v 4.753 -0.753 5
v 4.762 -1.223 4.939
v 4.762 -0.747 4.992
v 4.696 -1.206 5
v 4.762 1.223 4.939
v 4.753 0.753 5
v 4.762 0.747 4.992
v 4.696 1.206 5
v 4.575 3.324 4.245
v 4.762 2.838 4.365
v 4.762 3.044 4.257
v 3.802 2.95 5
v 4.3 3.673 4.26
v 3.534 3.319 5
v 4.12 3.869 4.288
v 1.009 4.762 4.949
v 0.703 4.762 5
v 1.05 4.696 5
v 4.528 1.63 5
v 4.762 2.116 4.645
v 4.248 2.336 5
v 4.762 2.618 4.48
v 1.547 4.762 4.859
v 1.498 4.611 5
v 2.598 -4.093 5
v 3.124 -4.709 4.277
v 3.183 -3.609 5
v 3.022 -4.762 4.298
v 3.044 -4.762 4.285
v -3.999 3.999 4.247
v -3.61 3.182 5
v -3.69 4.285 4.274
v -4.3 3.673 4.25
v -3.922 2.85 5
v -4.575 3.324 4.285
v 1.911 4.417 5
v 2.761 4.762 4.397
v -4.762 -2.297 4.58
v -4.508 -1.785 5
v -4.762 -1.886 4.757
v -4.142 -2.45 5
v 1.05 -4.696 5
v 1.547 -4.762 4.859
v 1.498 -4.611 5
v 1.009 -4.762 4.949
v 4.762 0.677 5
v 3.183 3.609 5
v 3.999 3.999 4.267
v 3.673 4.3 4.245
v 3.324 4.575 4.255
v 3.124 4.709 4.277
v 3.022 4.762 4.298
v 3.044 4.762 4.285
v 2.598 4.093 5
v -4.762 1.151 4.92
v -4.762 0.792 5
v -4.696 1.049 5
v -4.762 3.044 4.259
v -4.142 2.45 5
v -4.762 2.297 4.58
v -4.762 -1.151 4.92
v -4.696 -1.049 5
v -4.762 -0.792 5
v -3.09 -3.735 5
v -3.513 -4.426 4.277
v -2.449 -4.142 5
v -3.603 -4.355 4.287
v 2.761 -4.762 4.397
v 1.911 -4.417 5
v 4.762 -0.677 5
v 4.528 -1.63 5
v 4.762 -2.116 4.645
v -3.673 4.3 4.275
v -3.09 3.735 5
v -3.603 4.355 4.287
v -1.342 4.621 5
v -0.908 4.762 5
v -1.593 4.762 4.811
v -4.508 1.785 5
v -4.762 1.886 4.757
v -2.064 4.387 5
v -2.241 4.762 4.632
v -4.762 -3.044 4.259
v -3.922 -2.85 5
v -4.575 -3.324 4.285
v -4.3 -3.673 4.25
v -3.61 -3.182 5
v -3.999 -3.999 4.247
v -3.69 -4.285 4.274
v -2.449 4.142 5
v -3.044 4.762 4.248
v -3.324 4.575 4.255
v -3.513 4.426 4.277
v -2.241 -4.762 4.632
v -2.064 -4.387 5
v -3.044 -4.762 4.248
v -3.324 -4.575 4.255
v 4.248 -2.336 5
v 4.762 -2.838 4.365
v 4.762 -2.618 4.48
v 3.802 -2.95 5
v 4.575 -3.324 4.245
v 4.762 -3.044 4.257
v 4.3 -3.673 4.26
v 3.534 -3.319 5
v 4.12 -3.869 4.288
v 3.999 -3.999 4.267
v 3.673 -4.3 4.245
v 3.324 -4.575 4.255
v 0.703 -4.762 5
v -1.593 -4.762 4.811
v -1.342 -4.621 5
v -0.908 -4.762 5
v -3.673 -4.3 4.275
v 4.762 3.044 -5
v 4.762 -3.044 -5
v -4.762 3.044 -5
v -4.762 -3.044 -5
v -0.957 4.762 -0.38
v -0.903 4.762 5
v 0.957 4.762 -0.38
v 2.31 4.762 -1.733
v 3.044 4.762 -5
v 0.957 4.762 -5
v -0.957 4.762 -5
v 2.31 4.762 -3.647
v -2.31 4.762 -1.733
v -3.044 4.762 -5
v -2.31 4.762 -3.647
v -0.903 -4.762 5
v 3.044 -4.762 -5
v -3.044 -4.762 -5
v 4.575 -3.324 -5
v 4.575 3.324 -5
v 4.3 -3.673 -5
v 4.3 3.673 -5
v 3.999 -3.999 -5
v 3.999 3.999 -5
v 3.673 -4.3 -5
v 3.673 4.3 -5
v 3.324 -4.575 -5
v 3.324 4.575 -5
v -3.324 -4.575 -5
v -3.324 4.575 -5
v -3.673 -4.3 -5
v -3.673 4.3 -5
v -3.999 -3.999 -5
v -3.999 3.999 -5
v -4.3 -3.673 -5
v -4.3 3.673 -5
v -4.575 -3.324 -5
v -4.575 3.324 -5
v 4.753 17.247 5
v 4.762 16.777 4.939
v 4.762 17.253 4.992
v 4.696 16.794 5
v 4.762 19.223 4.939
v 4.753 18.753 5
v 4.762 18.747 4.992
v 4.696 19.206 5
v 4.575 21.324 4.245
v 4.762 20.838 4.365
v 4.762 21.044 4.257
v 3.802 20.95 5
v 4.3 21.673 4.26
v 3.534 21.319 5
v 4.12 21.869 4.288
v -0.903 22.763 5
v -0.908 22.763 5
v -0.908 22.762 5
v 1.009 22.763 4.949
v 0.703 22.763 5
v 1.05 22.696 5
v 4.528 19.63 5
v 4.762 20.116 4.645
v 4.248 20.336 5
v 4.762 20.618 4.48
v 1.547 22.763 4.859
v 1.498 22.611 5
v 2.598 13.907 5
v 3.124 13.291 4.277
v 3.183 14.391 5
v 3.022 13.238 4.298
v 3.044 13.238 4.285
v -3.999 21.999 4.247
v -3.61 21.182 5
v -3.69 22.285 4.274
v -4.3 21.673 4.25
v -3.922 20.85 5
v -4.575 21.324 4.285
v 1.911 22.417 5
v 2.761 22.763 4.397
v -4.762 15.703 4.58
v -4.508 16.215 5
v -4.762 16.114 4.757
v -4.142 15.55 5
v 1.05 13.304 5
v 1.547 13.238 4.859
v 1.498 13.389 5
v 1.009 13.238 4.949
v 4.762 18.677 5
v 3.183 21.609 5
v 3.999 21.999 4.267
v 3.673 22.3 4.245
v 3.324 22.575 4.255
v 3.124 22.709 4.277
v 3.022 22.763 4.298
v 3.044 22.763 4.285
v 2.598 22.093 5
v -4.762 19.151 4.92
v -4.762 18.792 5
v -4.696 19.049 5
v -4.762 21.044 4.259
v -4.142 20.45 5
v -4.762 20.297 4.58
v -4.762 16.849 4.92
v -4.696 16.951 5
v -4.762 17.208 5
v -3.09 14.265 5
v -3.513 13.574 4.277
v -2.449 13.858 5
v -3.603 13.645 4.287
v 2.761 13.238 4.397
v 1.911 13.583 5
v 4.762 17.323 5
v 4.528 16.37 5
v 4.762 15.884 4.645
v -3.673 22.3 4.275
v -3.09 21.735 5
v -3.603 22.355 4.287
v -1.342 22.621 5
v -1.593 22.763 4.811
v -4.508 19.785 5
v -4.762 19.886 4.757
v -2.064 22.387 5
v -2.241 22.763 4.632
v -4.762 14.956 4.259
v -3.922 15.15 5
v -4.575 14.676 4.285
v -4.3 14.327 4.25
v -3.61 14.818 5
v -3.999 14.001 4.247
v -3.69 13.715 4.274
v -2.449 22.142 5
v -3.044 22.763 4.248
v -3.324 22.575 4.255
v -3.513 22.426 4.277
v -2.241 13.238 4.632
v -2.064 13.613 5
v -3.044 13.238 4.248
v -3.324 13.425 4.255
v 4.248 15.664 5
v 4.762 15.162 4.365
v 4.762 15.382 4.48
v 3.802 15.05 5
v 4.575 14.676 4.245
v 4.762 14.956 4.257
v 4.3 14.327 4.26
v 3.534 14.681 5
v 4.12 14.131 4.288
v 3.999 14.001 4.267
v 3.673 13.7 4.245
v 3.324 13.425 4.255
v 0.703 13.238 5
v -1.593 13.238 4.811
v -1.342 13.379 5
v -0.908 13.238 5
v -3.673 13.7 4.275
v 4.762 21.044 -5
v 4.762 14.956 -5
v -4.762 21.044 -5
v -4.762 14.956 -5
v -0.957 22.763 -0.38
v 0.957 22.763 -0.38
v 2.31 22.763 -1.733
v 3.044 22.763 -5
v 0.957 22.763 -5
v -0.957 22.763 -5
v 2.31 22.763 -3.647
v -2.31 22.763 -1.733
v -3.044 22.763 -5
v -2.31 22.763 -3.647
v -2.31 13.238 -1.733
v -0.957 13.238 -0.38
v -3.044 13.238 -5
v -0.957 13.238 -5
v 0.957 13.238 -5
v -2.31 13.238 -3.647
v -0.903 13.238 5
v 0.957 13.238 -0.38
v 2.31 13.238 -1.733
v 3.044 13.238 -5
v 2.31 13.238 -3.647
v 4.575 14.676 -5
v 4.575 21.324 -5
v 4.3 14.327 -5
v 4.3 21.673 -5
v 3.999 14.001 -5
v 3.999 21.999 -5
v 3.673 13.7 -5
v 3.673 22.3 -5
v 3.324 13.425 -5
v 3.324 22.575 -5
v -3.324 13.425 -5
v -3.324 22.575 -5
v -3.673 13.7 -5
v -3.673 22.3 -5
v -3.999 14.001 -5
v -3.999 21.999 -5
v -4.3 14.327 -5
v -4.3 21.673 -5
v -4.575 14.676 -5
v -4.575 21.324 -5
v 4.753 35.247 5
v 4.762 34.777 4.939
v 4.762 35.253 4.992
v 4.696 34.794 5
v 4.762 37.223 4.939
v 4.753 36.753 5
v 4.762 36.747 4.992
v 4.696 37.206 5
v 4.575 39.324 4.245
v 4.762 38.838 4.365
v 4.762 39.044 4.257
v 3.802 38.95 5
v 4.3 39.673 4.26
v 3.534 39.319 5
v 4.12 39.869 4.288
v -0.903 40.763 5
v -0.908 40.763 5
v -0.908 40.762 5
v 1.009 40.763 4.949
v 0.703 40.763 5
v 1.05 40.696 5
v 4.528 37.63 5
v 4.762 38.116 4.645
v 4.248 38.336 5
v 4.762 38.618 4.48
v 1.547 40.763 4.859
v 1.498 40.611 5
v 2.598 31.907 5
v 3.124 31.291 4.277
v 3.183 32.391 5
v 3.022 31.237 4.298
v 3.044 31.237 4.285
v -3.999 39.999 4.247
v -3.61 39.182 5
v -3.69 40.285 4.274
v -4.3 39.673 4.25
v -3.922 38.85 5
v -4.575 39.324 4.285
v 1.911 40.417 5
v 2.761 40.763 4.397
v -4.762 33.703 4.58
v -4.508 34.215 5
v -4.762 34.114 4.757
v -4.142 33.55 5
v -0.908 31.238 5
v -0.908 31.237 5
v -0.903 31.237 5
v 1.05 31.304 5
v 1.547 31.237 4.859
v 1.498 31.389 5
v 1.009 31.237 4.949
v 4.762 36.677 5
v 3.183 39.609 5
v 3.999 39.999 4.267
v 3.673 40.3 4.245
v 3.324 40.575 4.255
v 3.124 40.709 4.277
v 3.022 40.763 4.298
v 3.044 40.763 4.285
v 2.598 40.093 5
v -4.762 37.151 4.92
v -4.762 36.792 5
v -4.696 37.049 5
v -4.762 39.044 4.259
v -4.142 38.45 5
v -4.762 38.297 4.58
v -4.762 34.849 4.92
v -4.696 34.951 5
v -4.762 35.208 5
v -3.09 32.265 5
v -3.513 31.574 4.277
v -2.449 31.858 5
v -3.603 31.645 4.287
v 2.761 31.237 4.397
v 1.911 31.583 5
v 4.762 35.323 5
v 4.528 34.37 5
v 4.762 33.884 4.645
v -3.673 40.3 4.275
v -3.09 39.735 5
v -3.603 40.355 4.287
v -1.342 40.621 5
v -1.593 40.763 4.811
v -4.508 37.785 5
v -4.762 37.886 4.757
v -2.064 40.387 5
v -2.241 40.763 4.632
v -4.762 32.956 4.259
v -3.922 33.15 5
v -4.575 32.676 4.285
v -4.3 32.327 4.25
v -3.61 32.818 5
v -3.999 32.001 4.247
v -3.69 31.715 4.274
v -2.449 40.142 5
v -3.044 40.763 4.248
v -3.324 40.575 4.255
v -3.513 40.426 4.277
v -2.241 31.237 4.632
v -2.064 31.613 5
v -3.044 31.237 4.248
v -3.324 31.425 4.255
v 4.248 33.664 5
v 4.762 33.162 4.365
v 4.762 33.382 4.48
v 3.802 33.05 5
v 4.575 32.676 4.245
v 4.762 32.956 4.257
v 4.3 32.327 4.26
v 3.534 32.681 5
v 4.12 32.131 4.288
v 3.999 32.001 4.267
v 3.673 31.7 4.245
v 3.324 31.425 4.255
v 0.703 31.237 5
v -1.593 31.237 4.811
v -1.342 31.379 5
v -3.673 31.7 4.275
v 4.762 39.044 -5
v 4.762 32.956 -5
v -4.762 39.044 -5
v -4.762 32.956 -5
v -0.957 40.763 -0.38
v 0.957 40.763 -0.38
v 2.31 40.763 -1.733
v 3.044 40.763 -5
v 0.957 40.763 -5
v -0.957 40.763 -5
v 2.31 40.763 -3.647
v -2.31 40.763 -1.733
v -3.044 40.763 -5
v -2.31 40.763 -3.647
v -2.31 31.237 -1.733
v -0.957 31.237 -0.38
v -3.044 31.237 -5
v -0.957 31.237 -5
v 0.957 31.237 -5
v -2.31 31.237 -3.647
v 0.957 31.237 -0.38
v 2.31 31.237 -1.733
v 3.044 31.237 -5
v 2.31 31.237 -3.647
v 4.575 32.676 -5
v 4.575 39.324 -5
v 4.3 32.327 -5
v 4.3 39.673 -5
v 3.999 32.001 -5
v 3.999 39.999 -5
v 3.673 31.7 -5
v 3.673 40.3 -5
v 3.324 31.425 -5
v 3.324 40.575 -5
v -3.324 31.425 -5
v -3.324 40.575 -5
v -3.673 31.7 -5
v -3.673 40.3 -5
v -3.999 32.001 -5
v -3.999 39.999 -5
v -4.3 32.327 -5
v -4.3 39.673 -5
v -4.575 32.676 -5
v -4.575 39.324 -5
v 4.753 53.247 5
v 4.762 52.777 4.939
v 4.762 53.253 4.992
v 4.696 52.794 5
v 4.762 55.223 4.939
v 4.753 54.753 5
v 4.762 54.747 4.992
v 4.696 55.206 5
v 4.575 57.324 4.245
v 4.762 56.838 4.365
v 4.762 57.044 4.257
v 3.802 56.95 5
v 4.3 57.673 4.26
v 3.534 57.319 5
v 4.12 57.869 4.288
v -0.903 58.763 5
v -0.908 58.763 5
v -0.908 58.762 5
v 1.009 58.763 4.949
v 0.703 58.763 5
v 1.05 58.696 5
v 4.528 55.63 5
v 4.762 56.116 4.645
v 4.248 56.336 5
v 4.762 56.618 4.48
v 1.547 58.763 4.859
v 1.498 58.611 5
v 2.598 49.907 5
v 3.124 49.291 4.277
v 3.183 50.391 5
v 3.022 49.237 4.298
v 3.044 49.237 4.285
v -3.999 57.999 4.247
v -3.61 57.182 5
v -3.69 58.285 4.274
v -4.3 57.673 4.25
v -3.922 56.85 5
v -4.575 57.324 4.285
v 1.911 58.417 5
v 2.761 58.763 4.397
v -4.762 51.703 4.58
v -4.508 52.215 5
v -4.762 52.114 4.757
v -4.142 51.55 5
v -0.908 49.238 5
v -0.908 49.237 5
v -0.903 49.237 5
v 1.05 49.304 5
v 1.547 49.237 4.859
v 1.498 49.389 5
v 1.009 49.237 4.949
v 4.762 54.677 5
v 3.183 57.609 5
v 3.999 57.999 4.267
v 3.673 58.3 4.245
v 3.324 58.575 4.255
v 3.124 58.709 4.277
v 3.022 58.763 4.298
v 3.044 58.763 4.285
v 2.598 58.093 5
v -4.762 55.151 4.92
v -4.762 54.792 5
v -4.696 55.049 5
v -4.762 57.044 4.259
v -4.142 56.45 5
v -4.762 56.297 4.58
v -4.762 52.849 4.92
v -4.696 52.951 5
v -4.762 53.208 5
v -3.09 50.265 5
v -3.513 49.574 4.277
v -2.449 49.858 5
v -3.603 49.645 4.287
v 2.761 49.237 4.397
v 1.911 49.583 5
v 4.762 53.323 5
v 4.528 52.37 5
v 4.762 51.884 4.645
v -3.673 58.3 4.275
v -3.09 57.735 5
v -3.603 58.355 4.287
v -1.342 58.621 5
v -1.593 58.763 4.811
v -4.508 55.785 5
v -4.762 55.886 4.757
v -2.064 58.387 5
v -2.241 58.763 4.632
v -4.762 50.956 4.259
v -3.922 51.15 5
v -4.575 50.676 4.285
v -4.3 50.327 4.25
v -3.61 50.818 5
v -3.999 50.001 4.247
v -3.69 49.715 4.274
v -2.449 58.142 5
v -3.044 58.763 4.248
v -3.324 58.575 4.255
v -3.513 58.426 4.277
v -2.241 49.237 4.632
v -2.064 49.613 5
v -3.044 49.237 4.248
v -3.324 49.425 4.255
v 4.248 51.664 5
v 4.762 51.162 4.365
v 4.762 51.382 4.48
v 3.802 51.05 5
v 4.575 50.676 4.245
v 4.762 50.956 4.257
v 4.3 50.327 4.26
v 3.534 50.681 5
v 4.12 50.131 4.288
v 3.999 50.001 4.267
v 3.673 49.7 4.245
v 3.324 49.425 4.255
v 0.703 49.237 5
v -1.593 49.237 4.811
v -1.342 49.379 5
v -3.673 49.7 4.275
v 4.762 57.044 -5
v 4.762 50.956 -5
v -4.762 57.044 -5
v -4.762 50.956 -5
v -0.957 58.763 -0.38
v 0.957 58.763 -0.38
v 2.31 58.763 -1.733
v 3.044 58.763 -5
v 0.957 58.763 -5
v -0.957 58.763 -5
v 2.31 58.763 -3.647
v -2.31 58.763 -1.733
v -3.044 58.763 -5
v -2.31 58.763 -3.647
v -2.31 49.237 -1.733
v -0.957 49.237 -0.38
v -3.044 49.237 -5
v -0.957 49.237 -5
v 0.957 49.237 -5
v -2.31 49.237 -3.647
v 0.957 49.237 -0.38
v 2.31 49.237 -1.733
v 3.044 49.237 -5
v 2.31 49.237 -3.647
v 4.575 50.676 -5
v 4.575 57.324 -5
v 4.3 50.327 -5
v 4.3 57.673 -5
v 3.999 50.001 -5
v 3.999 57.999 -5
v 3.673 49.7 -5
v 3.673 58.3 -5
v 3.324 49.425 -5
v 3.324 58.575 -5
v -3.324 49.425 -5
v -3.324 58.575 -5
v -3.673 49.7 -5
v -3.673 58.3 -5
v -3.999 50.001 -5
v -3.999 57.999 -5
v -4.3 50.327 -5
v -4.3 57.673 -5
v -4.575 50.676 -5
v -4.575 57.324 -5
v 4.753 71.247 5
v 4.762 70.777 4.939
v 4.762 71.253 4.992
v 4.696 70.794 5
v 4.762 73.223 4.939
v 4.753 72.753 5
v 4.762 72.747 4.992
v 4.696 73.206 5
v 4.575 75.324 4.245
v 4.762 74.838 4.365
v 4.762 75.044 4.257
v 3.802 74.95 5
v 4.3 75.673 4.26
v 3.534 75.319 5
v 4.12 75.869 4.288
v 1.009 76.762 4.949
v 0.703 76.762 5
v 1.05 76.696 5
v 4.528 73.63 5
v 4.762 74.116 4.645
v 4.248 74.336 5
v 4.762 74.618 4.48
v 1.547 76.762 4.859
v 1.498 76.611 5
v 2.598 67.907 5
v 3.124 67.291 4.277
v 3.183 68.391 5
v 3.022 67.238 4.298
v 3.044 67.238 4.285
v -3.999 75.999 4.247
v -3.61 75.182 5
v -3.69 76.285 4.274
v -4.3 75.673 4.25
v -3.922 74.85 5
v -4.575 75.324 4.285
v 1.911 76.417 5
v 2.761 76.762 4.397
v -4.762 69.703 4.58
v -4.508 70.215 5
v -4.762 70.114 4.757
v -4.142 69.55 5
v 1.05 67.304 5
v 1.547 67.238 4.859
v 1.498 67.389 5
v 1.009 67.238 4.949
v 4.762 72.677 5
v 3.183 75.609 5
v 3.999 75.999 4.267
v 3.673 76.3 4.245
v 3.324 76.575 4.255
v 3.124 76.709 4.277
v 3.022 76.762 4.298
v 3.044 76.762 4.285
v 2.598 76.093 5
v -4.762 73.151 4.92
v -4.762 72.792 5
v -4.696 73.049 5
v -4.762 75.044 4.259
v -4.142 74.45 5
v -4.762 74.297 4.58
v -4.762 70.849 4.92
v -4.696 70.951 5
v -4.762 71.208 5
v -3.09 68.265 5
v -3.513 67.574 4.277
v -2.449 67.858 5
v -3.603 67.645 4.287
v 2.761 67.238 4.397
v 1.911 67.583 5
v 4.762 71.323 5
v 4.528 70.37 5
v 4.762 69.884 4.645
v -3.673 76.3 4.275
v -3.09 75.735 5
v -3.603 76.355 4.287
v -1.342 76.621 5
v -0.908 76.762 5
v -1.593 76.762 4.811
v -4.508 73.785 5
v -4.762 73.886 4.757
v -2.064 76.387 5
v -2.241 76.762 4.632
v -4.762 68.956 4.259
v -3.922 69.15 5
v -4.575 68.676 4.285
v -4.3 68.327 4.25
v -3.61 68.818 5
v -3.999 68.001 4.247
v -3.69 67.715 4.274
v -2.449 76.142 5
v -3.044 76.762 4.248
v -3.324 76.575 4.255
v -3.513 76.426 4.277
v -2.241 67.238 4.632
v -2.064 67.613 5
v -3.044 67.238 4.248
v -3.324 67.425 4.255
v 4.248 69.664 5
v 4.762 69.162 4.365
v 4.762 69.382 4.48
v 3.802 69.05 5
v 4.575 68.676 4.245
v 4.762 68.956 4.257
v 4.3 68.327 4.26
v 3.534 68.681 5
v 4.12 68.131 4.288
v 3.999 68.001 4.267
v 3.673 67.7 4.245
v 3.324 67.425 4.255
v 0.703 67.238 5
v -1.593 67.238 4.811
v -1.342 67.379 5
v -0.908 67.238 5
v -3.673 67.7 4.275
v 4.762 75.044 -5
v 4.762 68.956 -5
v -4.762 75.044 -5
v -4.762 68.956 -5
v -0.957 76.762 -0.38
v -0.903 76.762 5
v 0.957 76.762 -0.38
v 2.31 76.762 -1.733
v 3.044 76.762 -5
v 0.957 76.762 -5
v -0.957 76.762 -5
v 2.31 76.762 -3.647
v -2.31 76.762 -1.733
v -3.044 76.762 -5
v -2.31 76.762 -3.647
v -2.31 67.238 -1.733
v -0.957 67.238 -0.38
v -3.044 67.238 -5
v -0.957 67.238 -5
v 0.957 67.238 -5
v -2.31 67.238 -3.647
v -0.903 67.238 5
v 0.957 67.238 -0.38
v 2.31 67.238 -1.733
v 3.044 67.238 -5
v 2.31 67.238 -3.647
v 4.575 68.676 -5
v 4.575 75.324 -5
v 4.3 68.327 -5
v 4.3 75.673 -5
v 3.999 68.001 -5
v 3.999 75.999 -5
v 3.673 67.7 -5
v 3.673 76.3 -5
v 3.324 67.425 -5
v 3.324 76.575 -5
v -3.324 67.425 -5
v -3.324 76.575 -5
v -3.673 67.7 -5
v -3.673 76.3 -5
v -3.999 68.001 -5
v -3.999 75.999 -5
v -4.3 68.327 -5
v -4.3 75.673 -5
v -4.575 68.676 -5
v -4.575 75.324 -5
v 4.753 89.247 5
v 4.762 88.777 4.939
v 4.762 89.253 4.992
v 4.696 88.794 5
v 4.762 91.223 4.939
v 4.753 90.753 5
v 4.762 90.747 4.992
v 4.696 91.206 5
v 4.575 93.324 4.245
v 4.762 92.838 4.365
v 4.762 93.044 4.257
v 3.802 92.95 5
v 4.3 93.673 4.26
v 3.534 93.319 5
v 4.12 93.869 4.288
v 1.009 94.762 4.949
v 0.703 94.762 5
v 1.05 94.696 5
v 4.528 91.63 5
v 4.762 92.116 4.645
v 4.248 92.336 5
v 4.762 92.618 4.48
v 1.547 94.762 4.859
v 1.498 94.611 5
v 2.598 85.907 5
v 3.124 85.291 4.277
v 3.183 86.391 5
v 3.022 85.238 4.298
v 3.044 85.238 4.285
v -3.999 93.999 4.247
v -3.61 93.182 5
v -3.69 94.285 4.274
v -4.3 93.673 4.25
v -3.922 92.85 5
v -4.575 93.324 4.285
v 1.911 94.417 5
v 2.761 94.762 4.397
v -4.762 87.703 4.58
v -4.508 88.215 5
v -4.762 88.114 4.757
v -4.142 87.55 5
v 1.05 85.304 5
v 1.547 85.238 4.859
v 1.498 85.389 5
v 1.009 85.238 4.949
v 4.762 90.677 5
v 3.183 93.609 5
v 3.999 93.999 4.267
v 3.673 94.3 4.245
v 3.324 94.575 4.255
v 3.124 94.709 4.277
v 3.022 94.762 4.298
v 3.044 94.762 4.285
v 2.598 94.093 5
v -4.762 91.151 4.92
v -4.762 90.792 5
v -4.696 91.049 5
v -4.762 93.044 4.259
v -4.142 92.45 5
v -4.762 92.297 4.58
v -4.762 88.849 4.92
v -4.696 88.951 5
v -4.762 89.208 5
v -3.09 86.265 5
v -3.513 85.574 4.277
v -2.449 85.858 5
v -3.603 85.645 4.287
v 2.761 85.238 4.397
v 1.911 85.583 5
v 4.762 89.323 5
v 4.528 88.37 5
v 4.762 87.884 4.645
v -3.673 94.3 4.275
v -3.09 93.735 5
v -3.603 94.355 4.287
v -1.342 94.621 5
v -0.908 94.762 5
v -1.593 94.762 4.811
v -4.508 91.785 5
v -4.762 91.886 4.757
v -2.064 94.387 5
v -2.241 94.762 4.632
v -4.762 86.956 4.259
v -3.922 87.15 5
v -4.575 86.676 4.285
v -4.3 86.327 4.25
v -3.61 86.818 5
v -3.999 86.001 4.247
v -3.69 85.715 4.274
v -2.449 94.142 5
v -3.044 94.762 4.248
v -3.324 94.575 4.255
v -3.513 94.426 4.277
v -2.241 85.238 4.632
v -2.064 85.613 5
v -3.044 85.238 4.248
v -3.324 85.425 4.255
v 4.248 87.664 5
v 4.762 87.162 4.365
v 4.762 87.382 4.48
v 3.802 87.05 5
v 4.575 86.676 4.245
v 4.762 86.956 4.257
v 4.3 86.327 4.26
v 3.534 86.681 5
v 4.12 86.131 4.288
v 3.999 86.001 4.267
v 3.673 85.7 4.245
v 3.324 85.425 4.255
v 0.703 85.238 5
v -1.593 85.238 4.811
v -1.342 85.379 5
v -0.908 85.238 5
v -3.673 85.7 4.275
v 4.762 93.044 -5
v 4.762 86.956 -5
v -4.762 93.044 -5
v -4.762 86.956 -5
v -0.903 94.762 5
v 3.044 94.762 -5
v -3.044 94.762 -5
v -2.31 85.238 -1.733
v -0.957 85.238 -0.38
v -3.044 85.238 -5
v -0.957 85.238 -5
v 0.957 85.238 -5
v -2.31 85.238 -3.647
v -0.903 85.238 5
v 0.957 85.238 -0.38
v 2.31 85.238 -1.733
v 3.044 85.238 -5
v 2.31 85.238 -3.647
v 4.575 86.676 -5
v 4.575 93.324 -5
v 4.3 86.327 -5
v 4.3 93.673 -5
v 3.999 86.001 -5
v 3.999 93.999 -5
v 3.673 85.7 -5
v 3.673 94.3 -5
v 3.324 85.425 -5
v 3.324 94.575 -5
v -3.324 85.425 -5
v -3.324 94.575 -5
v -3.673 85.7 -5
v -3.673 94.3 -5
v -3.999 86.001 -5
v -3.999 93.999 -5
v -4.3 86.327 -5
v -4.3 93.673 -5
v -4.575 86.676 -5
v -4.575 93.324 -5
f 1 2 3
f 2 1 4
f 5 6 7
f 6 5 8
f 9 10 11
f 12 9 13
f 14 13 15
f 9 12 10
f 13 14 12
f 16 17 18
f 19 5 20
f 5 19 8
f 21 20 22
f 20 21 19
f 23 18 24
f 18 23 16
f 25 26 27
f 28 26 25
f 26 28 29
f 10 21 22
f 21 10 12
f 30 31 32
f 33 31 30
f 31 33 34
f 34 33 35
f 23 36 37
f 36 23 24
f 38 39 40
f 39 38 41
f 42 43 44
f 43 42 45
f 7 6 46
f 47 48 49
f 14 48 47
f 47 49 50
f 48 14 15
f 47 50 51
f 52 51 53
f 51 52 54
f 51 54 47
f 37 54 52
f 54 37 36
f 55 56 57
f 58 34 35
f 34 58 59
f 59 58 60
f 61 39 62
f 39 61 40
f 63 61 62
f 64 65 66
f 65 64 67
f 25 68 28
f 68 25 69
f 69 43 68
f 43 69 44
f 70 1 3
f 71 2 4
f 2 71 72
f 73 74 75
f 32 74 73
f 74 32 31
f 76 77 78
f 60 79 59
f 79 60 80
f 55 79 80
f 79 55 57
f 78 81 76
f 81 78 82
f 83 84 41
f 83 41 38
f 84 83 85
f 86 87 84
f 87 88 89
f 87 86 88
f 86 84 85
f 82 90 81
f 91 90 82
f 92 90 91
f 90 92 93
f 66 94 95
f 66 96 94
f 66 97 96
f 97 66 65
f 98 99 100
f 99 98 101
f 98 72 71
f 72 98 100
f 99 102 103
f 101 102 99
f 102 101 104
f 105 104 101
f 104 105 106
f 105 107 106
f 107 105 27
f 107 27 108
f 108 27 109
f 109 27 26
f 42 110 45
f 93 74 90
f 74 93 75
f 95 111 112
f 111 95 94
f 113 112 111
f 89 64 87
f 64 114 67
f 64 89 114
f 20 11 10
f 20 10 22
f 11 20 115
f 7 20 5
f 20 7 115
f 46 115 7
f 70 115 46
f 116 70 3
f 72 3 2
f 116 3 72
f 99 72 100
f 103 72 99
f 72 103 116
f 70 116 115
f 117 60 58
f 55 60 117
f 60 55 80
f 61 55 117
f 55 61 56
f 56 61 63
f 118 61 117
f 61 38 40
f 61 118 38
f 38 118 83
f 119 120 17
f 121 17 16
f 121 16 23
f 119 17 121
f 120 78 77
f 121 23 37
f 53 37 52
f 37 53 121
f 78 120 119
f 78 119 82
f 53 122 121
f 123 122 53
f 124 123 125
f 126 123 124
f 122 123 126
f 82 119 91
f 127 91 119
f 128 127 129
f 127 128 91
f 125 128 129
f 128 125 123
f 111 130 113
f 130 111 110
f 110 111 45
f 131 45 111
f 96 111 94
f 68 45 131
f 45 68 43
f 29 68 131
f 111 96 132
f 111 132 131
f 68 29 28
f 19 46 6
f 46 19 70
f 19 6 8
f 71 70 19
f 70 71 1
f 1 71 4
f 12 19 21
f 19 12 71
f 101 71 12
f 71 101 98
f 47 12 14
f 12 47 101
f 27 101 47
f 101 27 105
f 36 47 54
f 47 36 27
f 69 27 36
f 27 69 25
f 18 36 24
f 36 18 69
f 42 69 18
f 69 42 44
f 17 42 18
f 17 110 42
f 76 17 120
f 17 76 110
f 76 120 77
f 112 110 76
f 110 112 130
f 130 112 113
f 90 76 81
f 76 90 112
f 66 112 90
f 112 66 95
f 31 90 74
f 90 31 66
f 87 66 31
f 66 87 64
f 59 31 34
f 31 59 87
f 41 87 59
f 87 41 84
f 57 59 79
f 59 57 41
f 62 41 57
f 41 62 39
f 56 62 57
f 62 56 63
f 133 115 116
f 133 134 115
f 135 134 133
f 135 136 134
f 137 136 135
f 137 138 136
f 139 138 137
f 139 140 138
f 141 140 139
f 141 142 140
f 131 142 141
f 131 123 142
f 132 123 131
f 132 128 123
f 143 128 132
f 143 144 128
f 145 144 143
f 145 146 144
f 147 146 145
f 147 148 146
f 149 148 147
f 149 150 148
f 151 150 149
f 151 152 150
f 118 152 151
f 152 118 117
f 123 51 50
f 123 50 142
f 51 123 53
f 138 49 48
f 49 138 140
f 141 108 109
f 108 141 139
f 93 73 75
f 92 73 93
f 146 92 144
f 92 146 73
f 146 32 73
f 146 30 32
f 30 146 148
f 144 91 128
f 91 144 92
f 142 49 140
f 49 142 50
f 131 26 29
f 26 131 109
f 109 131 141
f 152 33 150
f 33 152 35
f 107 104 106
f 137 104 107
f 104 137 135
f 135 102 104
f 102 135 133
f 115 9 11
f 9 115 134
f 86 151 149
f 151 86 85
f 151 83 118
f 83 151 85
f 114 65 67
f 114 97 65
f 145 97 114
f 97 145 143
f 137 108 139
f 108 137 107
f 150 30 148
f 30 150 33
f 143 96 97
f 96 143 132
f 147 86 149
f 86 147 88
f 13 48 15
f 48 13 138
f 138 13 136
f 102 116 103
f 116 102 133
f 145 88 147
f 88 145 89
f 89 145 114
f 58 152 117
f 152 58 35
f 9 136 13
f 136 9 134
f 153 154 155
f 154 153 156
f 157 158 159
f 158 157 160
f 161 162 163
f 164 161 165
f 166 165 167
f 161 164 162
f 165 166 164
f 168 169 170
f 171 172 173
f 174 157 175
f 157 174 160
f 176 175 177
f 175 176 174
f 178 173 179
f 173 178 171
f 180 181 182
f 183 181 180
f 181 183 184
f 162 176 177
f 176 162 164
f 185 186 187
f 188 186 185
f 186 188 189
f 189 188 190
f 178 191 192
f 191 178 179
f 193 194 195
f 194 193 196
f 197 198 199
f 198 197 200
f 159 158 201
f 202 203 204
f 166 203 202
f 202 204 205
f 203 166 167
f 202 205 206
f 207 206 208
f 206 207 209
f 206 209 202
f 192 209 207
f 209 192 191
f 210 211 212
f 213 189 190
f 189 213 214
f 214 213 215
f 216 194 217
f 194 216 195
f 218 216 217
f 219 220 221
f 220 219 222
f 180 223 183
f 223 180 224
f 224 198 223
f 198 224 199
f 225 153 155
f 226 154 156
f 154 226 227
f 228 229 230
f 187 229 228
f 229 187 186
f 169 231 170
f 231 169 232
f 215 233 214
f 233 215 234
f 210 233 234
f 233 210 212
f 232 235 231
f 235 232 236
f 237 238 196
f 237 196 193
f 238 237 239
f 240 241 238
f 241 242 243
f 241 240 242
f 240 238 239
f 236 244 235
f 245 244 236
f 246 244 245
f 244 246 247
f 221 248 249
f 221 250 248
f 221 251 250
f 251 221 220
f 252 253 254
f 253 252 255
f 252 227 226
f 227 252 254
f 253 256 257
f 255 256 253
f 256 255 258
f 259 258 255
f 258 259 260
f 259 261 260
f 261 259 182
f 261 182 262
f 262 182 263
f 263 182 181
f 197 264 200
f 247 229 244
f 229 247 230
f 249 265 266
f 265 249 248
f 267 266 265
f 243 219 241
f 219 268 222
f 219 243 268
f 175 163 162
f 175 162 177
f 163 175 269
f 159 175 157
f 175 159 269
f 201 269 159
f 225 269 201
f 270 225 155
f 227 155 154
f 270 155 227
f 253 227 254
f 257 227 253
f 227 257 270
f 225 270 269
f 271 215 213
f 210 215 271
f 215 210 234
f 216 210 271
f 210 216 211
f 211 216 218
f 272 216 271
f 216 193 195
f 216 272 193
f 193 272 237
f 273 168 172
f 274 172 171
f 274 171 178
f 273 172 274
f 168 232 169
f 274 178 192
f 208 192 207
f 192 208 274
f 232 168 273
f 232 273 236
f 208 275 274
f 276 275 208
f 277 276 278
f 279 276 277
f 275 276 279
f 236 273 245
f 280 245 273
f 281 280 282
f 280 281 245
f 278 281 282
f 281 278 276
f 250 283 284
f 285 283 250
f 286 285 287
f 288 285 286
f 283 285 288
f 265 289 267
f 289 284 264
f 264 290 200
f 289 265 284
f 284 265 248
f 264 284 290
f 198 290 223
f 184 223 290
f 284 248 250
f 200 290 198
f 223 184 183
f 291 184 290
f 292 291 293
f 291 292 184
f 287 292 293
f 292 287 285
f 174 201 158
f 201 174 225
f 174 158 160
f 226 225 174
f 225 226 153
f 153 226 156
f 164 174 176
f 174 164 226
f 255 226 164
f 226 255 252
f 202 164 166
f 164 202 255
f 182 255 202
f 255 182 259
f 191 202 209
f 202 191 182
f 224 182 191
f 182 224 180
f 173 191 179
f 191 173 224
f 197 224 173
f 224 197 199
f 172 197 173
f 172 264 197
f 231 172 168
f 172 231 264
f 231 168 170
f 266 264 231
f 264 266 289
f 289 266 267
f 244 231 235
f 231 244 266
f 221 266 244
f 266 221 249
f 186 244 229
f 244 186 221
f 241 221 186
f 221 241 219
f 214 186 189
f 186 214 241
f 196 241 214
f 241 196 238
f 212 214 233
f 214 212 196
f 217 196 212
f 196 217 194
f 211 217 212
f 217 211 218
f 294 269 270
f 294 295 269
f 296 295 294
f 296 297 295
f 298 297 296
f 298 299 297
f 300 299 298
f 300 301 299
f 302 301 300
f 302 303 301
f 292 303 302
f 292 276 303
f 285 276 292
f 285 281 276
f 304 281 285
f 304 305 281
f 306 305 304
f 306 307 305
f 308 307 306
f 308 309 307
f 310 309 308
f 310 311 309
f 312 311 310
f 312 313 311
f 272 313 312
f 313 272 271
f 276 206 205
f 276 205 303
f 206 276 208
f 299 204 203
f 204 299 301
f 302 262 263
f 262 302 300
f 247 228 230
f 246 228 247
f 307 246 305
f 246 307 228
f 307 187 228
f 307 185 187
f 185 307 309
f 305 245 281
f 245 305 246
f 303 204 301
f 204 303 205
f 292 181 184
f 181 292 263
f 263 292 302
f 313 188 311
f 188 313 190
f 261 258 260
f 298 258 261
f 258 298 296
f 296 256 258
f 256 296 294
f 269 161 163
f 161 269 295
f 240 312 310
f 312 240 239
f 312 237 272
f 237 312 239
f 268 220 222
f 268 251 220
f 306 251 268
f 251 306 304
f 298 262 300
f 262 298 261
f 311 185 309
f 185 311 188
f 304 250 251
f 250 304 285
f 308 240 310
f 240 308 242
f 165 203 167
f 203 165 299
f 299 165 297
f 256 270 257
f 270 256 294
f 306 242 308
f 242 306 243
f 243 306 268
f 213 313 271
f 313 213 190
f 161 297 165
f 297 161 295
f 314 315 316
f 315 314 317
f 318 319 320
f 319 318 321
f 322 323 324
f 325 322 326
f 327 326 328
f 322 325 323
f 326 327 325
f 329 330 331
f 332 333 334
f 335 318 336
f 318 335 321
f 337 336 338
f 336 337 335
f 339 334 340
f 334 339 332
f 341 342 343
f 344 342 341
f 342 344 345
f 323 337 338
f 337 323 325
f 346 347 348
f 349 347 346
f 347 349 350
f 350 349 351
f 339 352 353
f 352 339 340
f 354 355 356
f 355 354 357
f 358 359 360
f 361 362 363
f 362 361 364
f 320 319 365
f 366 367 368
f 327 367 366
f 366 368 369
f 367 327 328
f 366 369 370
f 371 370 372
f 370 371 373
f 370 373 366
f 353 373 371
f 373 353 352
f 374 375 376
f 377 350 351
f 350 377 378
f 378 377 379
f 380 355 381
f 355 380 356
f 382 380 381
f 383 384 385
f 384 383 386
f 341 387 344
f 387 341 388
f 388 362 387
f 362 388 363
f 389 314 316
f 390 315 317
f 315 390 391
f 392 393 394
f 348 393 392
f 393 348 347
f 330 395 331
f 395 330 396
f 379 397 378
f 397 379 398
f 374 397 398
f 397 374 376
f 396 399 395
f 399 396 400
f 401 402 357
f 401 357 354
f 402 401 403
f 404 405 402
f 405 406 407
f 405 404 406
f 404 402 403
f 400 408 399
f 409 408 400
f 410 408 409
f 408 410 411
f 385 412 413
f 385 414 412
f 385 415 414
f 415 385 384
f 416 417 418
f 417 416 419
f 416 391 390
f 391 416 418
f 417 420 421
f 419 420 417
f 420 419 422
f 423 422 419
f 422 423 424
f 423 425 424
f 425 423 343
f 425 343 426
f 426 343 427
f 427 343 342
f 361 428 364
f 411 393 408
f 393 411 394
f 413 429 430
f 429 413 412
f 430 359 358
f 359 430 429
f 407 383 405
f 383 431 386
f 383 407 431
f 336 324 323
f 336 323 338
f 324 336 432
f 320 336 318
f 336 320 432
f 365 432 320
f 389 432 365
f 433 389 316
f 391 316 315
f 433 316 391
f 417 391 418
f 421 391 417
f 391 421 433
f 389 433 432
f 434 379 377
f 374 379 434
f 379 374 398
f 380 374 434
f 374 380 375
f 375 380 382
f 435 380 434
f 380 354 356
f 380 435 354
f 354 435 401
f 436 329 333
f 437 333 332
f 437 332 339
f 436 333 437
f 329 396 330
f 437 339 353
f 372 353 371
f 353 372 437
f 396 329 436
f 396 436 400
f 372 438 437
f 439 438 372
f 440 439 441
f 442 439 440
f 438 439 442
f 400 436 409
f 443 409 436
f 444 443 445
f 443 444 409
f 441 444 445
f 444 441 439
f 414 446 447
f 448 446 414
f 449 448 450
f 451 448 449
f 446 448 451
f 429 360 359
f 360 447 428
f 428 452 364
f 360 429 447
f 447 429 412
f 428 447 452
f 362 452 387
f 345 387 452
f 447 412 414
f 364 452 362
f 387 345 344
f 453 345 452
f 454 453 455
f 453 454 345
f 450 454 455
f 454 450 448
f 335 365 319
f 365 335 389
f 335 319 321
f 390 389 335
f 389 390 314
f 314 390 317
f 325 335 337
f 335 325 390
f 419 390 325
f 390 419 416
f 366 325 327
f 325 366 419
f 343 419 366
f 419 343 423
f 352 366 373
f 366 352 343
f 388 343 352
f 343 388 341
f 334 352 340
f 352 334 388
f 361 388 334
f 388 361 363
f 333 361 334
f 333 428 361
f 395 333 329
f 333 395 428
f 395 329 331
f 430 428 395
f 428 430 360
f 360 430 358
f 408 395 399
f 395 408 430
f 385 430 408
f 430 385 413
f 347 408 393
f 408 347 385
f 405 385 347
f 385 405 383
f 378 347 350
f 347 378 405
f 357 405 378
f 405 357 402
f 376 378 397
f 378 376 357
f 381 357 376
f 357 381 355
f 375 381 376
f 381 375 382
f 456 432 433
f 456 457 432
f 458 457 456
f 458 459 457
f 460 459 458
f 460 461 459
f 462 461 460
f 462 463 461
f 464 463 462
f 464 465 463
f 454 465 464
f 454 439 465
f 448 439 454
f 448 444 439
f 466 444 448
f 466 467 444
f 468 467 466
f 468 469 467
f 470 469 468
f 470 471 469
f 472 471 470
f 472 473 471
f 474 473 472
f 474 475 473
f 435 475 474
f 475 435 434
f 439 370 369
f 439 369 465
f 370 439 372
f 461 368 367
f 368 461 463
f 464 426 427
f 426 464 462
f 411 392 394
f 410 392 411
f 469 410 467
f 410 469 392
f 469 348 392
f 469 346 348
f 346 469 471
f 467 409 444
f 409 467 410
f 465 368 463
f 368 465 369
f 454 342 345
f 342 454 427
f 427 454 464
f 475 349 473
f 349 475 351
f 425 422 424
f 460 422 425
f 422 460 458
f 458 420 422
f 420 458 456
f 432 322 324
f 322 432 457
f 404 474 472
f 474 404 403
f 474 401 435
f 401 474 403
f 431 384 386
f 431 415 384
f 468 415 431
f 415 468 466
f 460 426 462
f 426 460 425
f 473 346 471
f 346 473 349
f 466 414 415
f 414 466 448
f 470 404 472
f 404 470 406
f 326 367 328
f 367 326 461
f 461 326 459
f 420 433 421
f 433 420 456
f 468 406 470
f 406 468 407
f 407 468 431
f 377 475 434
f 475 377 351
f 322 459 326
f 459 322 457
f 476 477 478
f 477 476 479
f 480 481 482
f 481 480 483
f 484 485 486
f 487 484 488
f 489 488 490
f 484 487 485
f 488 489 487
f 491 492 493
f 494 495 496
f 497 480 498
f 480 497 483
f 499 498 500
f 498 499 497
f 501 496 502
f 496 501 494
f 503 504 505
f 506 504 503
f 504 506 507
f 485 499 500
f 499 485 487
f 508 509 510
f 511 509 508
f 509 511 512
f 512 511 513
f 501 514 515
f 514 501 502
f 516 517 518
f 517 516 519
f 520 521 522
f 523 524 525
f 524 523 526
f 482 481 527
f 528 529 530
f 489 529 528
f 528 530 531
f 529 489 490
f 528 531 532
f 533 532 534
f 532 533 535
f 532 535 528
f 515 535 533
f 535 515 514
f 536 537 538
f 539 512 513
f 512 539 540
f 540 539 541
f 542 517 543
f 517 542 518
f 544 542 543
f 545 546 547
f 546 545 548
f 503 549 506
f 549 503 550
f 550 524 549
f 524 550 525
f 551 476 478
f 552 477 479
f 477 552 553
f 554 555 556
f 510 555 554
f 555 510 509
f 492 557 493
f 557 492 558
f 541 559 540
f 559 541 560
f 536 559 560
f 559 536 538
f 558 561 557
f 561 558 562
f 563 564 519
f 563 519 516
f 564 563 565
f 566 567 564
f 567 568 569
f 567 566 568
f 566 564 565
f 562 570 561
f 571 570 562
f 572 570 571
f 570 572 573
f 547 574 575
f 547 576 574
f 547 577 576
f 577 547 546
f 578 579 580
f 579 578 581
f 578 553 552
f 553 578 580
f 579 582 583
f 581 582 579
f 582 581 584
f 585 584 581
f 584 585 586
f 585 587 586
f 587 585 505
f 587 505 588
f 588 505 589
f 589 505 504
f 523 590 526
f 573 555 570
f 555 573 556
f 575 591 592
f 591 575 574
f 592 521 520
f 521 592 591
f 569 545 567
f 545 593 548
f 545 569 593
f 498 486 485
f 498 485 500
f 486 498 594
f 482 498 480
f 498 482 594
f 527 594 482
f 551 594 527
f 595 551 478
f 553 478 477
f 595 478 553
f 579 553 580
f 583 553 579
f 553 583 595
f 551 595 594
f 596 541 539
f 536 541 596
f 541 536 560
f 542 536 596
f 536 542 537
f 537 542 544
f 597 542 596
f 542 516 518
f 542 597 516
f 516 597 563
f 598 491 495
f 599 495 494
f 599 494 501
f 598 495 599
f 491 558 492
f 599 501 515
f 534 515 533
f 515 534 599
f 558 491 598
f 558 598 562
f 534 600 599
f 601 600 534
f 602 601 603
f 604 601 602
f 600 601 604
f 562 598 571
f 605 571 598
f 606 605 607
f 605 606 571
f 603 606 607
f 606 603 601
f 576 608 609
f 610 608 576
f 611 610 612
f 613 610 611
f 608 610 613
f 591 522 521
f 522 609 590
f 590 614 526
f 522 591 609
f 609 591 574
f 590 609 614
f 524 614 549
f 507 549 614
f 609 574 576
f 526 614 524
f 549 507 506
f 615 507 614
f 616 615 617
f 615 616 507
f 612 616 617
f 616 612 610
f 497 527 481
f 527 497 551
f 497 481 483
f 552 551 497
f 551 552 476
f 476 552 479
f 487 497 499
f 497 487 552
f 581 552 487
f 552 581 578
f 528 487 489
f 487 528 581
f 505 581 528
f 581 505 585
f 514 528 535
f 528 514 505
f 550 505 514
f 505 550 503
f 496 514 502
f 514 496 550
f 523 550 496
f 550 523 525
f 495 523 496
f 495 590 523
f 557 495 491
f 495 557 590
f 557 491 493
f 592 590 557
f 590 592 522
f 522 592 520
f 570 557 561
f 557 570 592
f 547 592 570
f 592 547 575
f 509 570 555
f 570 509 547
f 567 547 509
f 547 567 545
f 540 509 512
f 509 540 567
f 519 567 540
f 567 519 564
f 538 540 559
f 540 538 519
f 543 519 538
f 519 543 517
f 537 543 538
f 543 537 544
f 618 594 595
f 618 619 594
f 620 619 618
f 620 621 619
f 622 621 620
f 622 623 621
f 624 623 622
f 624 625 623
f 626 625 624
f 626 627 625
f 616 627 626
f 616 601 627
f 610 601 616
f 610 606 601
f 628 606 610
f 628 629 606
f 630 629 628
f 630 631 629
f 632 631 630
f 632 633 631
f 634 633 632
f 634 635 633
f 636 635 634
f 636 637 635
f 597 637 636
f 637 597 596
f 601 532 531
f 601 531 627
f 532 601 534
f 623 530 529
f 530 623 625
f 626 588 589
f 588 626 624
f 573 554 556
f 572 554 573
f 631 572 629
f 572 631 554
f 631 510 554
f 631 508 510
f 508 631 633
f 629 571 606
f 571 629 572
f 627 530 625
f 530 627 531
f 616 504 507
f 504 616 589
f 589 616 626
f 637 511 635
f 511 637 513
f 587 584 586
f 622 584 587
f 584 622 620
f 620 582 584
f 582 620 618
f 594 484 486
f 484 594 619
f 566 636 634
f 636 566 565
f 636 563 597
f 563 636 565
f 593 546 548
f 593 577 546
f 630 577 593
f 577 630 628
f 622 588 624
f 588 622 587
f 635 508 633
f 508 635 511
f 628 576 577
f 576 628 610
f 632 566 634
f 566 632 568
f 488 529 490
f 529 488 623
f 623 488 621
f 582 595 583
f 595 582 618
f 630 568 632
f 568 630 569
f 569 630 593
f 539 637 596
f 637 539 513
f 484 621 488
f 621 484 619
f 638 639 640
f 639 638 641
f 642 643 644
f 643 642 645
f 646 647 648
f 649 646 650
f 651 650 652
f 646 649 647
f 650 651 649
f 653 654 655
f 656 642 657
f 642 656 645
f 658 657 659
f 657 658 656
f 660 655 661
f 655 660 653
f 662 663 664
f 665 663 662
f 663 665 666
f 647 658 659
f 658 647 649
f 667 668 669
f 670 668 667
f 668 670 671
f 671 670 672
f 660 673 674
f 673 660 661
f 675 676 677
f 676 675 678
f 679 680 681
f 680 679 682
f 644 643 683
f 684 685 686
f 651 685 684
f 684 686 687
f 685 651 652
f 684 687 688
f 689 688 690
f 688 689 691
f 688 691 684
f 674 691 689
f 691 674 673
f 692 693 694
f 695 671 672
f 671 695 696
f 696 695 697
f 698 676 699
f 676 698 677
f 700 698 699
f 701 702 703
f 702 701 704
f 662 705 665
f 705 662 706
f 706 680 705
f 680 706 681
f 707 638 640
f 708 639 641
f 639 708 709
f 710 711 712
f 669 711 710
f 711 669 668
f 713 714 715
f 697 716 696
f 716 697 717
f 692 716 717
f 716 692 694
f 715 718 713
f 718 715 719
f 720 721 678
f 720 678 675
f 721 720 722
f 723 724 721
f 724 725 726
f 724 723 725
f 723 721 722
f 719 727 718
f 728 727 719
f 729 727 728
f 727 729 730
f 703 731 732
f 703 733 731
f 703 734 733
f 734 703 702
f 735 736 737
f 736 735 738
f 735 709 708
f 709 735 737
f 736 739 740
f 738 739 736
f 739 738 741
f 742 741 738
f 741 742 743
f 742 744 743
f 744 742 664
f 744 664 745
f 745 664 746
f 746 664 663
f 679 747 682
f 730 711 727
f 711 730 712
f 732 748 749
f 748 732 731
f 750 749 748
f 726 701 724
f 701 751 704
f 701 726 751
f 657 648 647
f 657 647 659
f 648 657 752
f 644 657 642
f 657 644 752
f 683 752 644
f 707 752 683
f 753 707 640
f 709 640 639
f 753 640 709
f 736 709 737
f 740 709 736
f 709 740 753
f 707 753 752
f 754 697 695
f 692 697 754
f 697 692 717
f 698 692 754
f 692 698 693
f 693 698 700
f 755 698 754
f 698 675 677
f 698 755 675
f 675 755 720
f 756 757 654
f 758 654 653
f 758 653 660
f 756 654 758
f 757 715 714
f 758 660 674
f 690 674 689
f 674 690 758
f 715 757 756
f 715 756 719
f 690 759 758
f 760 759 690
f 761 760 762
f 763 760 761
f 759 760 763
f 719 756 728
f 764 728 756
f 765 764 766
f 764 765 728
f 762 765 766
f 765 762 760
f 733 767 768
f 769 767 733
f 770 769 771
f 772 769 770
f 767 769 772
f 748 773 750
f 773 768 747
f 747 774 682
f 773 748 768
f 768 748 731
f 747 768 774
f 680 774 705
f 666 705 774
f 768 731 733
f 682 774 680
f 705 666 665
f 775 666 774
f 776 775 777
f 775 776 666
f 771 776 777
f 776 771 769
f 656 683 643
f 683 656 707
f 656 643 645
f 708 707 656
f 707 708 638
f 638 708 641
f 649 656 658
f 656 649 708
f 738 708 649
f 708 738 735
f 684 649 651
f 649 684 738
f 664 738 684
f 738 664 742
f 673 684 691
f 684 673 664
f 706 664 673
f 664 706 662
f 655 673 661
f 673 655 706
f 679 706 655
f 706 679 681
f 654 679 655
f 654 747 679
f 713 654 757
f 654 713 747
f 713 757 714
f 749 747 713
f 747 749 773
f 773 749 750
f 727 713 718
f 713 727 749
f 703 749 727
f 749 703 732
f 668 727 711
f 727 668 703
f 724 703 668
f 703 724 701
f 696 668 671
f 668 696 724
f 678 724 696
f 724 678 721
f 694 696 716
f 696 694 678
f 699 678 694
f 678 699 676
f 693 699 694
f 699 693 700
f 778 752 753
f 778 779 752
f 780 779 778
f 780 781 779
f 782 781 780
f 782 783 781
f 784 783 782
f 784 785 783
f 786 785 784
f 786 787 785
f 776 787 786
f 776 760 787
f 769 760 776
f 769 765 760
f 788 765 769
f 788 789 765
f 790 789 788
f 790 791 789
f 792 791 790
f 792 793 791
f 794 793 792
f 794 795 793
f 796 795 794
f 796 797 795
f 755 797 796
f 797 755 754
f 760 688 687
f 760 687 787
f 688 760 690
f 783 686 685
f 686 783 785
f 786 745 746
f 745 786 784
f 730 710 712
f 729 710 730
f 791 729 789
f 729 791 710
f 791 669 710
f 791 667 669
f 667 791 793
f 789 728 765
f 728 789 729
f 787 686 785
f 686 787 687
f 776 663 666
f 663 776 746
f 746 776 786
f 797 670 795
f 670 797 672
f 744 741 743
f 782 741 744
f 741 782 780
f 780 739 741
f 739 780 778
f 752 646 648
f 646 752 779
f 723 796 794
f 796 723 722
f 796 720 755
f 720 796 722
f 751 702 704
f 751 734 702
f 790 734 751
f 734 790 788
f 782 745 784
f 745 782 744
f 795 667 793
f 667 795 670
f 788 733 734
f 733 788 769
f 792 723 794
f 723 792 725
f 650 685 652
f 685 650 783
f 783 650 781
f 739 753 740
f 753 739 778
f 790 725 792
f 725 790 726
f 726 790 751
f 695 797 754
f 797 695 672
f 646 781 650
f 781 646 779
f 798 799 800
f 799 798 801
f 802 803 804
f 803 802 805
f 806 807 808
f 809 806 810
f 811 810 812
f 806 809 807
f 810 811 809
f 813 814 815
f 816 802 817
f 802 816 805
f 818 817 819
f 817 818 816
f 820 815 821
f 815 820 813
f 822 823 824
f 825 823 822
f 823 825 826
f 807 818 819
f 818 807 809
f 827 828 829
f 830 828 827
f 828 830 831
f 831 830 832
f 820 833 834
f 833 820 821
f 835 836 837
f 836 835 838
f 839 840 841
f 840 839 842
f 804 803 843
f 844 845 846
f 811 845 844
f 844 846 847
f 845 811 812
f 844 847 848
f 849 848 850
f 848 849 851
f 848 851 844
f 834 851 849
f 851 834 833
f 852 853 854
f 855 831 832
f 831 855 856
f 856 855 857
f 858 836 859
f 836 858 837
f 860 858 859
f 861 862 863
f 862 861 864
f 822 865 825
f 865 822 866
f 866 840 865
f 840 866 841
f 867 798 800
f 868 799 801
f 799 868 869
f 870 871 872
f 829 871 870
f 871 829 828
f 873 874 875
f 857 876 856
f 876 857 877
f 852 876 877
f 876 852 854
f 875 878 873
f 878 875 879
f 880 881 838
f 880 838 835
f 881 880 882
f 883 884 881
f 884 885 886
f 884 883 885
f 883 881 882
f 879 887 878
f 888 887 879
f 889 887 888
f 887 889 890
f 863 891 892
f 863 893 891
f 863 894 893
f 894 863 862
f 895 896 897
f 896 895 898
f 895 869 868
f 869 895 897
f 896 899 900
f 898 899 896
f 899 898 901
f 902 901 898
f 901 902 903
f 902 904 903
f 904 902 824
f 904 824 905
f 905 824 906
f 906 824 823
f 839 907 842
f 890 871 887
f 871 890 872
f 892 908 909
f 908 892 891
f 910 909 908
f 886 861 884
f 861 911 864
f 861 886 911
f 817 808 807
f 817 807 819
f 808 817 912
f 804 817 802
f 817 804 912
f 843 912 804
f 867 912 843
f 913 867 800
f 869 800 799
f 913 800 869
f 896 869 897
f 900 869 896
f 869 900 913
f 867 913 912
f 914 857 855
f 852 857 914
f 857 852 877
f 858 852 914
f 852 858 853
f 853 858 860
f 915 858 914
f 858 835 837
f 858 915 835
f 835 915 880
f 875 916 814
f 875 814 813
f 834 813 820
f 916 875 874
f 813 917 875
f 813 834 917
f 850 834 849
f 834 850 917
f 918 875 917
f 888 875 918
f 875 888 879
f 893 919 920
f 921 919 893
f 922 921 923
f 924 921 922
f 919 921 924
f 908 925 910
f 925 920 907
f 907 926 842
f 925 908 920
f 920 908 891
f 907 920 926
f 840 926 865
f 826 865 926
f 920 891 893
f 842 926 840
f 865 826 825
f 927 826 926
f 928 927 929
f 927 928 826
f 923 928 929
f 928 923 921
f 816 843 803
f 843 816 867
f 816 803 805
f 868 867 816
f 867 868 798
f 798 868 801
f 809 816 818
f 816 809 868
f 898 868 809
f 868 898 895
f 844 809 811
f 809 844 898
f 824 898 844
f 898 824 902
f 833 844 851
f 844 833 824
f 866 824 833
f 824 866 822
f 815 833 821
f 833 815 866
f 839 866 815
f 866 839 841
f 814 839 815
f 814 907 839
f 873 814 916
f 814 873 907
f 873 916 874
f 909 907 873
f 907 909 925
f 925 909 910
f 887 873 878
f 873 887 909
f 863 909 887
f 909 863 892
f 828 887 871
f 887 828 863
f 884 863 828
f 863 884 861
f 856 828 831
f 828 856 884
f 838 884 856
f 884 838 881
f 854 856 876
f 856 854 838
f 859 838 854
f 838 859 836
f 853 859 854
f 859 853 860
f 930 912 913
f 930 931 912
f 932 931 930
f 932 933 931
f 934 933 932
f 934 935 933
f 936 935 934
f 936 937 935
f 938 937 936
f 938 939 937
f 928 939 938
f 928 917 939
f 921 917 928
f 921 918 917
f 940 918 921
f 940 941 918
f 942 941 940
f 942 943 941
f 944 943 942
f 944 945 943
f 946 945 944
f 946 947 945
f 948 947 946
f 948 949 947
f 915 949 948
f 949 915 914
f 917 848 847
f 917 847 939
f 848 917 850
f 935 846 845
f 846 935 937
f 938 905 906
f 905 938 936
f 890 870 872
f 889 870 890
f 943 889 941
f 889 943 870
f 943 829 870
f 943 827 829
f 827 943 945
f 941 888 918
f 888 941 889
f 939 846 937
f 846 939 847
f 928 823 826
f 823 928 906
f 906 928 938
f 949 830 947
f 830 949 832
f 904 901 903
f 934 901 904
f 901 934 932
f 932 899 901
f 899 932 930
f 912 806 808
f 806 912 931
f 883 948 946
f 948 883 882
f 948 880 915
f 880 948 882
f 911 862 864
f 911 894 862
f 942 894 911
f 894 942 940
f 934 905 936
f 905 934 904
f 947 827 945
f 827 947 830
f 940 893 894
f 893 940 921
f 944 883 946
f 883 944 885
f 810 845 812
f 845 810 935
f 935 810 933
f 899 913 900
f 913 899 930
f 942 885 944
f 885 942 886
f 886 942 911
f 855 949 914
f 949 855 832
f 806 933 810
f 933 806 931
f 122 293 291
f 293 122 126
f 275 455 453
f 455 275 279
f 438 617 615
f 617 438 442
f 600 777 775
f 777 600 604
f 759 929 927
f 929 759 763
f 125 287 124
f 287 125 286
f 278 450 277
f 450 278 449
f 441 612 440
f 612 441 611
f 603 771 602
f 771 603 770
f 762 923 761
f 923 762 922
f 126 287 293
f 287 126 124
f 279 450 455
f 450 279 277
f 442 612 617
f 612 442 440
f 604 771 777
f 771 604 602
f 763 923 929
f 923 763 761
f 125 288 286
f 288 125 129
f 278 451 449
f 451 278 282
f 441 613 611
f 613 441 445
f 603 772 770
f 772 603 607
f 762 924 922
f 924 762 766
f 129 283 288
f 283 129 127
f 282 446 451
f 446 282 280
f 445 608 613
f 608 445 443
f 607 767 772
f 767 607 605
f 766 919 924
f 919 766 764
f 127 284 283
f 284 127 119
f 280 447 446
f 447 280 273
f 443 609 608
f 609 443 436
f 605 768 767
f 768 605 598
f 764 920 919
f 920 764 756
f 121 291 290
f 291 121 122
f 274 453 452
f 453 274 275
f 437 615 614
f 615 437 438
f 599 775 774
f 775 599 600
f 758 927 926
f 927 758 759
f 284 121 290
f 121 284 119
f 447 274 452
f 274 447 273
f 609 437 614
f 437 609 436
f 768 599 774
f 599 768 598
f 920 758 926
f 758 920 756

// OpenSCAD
module socket(w=20,l=20,h=14,d=3/8)
{
  difference() {
    cube([w+2,l+2,h],center=true);
    translate([0,0,2])
      cylinder(r=w/2,h,$fn=50,center=true);
  }
  notch(w,l,h,d);
}
module notch(w=20,l=20,h=14,d=3/8)
{
  dm=25.4*d; //25.4
  ch=h;
  intersection(){
  cube([dm,dm,ch],center=true);
    union(){
    translate([0,0,-1])
    sphere(d=dm+6);
      translate([0,0,-1*ch/4])
        cube([dm,dm,ch],center=true);
    }
    cylinder(r=dm*19/32,h=h,$fn=80,center=true);
  }
  //translate([dm/2,0,(ch/2)-3])
  //sphere(dm/10,$fn=50,center=true);
}
translate([0,0,-2.69]) rotate([-90,22.5,0]) cylinder(d=5,h=90,$fn=8);
for(i=[0:5]) {
    translate([0,18*i,0]) notch(h=10);
}
